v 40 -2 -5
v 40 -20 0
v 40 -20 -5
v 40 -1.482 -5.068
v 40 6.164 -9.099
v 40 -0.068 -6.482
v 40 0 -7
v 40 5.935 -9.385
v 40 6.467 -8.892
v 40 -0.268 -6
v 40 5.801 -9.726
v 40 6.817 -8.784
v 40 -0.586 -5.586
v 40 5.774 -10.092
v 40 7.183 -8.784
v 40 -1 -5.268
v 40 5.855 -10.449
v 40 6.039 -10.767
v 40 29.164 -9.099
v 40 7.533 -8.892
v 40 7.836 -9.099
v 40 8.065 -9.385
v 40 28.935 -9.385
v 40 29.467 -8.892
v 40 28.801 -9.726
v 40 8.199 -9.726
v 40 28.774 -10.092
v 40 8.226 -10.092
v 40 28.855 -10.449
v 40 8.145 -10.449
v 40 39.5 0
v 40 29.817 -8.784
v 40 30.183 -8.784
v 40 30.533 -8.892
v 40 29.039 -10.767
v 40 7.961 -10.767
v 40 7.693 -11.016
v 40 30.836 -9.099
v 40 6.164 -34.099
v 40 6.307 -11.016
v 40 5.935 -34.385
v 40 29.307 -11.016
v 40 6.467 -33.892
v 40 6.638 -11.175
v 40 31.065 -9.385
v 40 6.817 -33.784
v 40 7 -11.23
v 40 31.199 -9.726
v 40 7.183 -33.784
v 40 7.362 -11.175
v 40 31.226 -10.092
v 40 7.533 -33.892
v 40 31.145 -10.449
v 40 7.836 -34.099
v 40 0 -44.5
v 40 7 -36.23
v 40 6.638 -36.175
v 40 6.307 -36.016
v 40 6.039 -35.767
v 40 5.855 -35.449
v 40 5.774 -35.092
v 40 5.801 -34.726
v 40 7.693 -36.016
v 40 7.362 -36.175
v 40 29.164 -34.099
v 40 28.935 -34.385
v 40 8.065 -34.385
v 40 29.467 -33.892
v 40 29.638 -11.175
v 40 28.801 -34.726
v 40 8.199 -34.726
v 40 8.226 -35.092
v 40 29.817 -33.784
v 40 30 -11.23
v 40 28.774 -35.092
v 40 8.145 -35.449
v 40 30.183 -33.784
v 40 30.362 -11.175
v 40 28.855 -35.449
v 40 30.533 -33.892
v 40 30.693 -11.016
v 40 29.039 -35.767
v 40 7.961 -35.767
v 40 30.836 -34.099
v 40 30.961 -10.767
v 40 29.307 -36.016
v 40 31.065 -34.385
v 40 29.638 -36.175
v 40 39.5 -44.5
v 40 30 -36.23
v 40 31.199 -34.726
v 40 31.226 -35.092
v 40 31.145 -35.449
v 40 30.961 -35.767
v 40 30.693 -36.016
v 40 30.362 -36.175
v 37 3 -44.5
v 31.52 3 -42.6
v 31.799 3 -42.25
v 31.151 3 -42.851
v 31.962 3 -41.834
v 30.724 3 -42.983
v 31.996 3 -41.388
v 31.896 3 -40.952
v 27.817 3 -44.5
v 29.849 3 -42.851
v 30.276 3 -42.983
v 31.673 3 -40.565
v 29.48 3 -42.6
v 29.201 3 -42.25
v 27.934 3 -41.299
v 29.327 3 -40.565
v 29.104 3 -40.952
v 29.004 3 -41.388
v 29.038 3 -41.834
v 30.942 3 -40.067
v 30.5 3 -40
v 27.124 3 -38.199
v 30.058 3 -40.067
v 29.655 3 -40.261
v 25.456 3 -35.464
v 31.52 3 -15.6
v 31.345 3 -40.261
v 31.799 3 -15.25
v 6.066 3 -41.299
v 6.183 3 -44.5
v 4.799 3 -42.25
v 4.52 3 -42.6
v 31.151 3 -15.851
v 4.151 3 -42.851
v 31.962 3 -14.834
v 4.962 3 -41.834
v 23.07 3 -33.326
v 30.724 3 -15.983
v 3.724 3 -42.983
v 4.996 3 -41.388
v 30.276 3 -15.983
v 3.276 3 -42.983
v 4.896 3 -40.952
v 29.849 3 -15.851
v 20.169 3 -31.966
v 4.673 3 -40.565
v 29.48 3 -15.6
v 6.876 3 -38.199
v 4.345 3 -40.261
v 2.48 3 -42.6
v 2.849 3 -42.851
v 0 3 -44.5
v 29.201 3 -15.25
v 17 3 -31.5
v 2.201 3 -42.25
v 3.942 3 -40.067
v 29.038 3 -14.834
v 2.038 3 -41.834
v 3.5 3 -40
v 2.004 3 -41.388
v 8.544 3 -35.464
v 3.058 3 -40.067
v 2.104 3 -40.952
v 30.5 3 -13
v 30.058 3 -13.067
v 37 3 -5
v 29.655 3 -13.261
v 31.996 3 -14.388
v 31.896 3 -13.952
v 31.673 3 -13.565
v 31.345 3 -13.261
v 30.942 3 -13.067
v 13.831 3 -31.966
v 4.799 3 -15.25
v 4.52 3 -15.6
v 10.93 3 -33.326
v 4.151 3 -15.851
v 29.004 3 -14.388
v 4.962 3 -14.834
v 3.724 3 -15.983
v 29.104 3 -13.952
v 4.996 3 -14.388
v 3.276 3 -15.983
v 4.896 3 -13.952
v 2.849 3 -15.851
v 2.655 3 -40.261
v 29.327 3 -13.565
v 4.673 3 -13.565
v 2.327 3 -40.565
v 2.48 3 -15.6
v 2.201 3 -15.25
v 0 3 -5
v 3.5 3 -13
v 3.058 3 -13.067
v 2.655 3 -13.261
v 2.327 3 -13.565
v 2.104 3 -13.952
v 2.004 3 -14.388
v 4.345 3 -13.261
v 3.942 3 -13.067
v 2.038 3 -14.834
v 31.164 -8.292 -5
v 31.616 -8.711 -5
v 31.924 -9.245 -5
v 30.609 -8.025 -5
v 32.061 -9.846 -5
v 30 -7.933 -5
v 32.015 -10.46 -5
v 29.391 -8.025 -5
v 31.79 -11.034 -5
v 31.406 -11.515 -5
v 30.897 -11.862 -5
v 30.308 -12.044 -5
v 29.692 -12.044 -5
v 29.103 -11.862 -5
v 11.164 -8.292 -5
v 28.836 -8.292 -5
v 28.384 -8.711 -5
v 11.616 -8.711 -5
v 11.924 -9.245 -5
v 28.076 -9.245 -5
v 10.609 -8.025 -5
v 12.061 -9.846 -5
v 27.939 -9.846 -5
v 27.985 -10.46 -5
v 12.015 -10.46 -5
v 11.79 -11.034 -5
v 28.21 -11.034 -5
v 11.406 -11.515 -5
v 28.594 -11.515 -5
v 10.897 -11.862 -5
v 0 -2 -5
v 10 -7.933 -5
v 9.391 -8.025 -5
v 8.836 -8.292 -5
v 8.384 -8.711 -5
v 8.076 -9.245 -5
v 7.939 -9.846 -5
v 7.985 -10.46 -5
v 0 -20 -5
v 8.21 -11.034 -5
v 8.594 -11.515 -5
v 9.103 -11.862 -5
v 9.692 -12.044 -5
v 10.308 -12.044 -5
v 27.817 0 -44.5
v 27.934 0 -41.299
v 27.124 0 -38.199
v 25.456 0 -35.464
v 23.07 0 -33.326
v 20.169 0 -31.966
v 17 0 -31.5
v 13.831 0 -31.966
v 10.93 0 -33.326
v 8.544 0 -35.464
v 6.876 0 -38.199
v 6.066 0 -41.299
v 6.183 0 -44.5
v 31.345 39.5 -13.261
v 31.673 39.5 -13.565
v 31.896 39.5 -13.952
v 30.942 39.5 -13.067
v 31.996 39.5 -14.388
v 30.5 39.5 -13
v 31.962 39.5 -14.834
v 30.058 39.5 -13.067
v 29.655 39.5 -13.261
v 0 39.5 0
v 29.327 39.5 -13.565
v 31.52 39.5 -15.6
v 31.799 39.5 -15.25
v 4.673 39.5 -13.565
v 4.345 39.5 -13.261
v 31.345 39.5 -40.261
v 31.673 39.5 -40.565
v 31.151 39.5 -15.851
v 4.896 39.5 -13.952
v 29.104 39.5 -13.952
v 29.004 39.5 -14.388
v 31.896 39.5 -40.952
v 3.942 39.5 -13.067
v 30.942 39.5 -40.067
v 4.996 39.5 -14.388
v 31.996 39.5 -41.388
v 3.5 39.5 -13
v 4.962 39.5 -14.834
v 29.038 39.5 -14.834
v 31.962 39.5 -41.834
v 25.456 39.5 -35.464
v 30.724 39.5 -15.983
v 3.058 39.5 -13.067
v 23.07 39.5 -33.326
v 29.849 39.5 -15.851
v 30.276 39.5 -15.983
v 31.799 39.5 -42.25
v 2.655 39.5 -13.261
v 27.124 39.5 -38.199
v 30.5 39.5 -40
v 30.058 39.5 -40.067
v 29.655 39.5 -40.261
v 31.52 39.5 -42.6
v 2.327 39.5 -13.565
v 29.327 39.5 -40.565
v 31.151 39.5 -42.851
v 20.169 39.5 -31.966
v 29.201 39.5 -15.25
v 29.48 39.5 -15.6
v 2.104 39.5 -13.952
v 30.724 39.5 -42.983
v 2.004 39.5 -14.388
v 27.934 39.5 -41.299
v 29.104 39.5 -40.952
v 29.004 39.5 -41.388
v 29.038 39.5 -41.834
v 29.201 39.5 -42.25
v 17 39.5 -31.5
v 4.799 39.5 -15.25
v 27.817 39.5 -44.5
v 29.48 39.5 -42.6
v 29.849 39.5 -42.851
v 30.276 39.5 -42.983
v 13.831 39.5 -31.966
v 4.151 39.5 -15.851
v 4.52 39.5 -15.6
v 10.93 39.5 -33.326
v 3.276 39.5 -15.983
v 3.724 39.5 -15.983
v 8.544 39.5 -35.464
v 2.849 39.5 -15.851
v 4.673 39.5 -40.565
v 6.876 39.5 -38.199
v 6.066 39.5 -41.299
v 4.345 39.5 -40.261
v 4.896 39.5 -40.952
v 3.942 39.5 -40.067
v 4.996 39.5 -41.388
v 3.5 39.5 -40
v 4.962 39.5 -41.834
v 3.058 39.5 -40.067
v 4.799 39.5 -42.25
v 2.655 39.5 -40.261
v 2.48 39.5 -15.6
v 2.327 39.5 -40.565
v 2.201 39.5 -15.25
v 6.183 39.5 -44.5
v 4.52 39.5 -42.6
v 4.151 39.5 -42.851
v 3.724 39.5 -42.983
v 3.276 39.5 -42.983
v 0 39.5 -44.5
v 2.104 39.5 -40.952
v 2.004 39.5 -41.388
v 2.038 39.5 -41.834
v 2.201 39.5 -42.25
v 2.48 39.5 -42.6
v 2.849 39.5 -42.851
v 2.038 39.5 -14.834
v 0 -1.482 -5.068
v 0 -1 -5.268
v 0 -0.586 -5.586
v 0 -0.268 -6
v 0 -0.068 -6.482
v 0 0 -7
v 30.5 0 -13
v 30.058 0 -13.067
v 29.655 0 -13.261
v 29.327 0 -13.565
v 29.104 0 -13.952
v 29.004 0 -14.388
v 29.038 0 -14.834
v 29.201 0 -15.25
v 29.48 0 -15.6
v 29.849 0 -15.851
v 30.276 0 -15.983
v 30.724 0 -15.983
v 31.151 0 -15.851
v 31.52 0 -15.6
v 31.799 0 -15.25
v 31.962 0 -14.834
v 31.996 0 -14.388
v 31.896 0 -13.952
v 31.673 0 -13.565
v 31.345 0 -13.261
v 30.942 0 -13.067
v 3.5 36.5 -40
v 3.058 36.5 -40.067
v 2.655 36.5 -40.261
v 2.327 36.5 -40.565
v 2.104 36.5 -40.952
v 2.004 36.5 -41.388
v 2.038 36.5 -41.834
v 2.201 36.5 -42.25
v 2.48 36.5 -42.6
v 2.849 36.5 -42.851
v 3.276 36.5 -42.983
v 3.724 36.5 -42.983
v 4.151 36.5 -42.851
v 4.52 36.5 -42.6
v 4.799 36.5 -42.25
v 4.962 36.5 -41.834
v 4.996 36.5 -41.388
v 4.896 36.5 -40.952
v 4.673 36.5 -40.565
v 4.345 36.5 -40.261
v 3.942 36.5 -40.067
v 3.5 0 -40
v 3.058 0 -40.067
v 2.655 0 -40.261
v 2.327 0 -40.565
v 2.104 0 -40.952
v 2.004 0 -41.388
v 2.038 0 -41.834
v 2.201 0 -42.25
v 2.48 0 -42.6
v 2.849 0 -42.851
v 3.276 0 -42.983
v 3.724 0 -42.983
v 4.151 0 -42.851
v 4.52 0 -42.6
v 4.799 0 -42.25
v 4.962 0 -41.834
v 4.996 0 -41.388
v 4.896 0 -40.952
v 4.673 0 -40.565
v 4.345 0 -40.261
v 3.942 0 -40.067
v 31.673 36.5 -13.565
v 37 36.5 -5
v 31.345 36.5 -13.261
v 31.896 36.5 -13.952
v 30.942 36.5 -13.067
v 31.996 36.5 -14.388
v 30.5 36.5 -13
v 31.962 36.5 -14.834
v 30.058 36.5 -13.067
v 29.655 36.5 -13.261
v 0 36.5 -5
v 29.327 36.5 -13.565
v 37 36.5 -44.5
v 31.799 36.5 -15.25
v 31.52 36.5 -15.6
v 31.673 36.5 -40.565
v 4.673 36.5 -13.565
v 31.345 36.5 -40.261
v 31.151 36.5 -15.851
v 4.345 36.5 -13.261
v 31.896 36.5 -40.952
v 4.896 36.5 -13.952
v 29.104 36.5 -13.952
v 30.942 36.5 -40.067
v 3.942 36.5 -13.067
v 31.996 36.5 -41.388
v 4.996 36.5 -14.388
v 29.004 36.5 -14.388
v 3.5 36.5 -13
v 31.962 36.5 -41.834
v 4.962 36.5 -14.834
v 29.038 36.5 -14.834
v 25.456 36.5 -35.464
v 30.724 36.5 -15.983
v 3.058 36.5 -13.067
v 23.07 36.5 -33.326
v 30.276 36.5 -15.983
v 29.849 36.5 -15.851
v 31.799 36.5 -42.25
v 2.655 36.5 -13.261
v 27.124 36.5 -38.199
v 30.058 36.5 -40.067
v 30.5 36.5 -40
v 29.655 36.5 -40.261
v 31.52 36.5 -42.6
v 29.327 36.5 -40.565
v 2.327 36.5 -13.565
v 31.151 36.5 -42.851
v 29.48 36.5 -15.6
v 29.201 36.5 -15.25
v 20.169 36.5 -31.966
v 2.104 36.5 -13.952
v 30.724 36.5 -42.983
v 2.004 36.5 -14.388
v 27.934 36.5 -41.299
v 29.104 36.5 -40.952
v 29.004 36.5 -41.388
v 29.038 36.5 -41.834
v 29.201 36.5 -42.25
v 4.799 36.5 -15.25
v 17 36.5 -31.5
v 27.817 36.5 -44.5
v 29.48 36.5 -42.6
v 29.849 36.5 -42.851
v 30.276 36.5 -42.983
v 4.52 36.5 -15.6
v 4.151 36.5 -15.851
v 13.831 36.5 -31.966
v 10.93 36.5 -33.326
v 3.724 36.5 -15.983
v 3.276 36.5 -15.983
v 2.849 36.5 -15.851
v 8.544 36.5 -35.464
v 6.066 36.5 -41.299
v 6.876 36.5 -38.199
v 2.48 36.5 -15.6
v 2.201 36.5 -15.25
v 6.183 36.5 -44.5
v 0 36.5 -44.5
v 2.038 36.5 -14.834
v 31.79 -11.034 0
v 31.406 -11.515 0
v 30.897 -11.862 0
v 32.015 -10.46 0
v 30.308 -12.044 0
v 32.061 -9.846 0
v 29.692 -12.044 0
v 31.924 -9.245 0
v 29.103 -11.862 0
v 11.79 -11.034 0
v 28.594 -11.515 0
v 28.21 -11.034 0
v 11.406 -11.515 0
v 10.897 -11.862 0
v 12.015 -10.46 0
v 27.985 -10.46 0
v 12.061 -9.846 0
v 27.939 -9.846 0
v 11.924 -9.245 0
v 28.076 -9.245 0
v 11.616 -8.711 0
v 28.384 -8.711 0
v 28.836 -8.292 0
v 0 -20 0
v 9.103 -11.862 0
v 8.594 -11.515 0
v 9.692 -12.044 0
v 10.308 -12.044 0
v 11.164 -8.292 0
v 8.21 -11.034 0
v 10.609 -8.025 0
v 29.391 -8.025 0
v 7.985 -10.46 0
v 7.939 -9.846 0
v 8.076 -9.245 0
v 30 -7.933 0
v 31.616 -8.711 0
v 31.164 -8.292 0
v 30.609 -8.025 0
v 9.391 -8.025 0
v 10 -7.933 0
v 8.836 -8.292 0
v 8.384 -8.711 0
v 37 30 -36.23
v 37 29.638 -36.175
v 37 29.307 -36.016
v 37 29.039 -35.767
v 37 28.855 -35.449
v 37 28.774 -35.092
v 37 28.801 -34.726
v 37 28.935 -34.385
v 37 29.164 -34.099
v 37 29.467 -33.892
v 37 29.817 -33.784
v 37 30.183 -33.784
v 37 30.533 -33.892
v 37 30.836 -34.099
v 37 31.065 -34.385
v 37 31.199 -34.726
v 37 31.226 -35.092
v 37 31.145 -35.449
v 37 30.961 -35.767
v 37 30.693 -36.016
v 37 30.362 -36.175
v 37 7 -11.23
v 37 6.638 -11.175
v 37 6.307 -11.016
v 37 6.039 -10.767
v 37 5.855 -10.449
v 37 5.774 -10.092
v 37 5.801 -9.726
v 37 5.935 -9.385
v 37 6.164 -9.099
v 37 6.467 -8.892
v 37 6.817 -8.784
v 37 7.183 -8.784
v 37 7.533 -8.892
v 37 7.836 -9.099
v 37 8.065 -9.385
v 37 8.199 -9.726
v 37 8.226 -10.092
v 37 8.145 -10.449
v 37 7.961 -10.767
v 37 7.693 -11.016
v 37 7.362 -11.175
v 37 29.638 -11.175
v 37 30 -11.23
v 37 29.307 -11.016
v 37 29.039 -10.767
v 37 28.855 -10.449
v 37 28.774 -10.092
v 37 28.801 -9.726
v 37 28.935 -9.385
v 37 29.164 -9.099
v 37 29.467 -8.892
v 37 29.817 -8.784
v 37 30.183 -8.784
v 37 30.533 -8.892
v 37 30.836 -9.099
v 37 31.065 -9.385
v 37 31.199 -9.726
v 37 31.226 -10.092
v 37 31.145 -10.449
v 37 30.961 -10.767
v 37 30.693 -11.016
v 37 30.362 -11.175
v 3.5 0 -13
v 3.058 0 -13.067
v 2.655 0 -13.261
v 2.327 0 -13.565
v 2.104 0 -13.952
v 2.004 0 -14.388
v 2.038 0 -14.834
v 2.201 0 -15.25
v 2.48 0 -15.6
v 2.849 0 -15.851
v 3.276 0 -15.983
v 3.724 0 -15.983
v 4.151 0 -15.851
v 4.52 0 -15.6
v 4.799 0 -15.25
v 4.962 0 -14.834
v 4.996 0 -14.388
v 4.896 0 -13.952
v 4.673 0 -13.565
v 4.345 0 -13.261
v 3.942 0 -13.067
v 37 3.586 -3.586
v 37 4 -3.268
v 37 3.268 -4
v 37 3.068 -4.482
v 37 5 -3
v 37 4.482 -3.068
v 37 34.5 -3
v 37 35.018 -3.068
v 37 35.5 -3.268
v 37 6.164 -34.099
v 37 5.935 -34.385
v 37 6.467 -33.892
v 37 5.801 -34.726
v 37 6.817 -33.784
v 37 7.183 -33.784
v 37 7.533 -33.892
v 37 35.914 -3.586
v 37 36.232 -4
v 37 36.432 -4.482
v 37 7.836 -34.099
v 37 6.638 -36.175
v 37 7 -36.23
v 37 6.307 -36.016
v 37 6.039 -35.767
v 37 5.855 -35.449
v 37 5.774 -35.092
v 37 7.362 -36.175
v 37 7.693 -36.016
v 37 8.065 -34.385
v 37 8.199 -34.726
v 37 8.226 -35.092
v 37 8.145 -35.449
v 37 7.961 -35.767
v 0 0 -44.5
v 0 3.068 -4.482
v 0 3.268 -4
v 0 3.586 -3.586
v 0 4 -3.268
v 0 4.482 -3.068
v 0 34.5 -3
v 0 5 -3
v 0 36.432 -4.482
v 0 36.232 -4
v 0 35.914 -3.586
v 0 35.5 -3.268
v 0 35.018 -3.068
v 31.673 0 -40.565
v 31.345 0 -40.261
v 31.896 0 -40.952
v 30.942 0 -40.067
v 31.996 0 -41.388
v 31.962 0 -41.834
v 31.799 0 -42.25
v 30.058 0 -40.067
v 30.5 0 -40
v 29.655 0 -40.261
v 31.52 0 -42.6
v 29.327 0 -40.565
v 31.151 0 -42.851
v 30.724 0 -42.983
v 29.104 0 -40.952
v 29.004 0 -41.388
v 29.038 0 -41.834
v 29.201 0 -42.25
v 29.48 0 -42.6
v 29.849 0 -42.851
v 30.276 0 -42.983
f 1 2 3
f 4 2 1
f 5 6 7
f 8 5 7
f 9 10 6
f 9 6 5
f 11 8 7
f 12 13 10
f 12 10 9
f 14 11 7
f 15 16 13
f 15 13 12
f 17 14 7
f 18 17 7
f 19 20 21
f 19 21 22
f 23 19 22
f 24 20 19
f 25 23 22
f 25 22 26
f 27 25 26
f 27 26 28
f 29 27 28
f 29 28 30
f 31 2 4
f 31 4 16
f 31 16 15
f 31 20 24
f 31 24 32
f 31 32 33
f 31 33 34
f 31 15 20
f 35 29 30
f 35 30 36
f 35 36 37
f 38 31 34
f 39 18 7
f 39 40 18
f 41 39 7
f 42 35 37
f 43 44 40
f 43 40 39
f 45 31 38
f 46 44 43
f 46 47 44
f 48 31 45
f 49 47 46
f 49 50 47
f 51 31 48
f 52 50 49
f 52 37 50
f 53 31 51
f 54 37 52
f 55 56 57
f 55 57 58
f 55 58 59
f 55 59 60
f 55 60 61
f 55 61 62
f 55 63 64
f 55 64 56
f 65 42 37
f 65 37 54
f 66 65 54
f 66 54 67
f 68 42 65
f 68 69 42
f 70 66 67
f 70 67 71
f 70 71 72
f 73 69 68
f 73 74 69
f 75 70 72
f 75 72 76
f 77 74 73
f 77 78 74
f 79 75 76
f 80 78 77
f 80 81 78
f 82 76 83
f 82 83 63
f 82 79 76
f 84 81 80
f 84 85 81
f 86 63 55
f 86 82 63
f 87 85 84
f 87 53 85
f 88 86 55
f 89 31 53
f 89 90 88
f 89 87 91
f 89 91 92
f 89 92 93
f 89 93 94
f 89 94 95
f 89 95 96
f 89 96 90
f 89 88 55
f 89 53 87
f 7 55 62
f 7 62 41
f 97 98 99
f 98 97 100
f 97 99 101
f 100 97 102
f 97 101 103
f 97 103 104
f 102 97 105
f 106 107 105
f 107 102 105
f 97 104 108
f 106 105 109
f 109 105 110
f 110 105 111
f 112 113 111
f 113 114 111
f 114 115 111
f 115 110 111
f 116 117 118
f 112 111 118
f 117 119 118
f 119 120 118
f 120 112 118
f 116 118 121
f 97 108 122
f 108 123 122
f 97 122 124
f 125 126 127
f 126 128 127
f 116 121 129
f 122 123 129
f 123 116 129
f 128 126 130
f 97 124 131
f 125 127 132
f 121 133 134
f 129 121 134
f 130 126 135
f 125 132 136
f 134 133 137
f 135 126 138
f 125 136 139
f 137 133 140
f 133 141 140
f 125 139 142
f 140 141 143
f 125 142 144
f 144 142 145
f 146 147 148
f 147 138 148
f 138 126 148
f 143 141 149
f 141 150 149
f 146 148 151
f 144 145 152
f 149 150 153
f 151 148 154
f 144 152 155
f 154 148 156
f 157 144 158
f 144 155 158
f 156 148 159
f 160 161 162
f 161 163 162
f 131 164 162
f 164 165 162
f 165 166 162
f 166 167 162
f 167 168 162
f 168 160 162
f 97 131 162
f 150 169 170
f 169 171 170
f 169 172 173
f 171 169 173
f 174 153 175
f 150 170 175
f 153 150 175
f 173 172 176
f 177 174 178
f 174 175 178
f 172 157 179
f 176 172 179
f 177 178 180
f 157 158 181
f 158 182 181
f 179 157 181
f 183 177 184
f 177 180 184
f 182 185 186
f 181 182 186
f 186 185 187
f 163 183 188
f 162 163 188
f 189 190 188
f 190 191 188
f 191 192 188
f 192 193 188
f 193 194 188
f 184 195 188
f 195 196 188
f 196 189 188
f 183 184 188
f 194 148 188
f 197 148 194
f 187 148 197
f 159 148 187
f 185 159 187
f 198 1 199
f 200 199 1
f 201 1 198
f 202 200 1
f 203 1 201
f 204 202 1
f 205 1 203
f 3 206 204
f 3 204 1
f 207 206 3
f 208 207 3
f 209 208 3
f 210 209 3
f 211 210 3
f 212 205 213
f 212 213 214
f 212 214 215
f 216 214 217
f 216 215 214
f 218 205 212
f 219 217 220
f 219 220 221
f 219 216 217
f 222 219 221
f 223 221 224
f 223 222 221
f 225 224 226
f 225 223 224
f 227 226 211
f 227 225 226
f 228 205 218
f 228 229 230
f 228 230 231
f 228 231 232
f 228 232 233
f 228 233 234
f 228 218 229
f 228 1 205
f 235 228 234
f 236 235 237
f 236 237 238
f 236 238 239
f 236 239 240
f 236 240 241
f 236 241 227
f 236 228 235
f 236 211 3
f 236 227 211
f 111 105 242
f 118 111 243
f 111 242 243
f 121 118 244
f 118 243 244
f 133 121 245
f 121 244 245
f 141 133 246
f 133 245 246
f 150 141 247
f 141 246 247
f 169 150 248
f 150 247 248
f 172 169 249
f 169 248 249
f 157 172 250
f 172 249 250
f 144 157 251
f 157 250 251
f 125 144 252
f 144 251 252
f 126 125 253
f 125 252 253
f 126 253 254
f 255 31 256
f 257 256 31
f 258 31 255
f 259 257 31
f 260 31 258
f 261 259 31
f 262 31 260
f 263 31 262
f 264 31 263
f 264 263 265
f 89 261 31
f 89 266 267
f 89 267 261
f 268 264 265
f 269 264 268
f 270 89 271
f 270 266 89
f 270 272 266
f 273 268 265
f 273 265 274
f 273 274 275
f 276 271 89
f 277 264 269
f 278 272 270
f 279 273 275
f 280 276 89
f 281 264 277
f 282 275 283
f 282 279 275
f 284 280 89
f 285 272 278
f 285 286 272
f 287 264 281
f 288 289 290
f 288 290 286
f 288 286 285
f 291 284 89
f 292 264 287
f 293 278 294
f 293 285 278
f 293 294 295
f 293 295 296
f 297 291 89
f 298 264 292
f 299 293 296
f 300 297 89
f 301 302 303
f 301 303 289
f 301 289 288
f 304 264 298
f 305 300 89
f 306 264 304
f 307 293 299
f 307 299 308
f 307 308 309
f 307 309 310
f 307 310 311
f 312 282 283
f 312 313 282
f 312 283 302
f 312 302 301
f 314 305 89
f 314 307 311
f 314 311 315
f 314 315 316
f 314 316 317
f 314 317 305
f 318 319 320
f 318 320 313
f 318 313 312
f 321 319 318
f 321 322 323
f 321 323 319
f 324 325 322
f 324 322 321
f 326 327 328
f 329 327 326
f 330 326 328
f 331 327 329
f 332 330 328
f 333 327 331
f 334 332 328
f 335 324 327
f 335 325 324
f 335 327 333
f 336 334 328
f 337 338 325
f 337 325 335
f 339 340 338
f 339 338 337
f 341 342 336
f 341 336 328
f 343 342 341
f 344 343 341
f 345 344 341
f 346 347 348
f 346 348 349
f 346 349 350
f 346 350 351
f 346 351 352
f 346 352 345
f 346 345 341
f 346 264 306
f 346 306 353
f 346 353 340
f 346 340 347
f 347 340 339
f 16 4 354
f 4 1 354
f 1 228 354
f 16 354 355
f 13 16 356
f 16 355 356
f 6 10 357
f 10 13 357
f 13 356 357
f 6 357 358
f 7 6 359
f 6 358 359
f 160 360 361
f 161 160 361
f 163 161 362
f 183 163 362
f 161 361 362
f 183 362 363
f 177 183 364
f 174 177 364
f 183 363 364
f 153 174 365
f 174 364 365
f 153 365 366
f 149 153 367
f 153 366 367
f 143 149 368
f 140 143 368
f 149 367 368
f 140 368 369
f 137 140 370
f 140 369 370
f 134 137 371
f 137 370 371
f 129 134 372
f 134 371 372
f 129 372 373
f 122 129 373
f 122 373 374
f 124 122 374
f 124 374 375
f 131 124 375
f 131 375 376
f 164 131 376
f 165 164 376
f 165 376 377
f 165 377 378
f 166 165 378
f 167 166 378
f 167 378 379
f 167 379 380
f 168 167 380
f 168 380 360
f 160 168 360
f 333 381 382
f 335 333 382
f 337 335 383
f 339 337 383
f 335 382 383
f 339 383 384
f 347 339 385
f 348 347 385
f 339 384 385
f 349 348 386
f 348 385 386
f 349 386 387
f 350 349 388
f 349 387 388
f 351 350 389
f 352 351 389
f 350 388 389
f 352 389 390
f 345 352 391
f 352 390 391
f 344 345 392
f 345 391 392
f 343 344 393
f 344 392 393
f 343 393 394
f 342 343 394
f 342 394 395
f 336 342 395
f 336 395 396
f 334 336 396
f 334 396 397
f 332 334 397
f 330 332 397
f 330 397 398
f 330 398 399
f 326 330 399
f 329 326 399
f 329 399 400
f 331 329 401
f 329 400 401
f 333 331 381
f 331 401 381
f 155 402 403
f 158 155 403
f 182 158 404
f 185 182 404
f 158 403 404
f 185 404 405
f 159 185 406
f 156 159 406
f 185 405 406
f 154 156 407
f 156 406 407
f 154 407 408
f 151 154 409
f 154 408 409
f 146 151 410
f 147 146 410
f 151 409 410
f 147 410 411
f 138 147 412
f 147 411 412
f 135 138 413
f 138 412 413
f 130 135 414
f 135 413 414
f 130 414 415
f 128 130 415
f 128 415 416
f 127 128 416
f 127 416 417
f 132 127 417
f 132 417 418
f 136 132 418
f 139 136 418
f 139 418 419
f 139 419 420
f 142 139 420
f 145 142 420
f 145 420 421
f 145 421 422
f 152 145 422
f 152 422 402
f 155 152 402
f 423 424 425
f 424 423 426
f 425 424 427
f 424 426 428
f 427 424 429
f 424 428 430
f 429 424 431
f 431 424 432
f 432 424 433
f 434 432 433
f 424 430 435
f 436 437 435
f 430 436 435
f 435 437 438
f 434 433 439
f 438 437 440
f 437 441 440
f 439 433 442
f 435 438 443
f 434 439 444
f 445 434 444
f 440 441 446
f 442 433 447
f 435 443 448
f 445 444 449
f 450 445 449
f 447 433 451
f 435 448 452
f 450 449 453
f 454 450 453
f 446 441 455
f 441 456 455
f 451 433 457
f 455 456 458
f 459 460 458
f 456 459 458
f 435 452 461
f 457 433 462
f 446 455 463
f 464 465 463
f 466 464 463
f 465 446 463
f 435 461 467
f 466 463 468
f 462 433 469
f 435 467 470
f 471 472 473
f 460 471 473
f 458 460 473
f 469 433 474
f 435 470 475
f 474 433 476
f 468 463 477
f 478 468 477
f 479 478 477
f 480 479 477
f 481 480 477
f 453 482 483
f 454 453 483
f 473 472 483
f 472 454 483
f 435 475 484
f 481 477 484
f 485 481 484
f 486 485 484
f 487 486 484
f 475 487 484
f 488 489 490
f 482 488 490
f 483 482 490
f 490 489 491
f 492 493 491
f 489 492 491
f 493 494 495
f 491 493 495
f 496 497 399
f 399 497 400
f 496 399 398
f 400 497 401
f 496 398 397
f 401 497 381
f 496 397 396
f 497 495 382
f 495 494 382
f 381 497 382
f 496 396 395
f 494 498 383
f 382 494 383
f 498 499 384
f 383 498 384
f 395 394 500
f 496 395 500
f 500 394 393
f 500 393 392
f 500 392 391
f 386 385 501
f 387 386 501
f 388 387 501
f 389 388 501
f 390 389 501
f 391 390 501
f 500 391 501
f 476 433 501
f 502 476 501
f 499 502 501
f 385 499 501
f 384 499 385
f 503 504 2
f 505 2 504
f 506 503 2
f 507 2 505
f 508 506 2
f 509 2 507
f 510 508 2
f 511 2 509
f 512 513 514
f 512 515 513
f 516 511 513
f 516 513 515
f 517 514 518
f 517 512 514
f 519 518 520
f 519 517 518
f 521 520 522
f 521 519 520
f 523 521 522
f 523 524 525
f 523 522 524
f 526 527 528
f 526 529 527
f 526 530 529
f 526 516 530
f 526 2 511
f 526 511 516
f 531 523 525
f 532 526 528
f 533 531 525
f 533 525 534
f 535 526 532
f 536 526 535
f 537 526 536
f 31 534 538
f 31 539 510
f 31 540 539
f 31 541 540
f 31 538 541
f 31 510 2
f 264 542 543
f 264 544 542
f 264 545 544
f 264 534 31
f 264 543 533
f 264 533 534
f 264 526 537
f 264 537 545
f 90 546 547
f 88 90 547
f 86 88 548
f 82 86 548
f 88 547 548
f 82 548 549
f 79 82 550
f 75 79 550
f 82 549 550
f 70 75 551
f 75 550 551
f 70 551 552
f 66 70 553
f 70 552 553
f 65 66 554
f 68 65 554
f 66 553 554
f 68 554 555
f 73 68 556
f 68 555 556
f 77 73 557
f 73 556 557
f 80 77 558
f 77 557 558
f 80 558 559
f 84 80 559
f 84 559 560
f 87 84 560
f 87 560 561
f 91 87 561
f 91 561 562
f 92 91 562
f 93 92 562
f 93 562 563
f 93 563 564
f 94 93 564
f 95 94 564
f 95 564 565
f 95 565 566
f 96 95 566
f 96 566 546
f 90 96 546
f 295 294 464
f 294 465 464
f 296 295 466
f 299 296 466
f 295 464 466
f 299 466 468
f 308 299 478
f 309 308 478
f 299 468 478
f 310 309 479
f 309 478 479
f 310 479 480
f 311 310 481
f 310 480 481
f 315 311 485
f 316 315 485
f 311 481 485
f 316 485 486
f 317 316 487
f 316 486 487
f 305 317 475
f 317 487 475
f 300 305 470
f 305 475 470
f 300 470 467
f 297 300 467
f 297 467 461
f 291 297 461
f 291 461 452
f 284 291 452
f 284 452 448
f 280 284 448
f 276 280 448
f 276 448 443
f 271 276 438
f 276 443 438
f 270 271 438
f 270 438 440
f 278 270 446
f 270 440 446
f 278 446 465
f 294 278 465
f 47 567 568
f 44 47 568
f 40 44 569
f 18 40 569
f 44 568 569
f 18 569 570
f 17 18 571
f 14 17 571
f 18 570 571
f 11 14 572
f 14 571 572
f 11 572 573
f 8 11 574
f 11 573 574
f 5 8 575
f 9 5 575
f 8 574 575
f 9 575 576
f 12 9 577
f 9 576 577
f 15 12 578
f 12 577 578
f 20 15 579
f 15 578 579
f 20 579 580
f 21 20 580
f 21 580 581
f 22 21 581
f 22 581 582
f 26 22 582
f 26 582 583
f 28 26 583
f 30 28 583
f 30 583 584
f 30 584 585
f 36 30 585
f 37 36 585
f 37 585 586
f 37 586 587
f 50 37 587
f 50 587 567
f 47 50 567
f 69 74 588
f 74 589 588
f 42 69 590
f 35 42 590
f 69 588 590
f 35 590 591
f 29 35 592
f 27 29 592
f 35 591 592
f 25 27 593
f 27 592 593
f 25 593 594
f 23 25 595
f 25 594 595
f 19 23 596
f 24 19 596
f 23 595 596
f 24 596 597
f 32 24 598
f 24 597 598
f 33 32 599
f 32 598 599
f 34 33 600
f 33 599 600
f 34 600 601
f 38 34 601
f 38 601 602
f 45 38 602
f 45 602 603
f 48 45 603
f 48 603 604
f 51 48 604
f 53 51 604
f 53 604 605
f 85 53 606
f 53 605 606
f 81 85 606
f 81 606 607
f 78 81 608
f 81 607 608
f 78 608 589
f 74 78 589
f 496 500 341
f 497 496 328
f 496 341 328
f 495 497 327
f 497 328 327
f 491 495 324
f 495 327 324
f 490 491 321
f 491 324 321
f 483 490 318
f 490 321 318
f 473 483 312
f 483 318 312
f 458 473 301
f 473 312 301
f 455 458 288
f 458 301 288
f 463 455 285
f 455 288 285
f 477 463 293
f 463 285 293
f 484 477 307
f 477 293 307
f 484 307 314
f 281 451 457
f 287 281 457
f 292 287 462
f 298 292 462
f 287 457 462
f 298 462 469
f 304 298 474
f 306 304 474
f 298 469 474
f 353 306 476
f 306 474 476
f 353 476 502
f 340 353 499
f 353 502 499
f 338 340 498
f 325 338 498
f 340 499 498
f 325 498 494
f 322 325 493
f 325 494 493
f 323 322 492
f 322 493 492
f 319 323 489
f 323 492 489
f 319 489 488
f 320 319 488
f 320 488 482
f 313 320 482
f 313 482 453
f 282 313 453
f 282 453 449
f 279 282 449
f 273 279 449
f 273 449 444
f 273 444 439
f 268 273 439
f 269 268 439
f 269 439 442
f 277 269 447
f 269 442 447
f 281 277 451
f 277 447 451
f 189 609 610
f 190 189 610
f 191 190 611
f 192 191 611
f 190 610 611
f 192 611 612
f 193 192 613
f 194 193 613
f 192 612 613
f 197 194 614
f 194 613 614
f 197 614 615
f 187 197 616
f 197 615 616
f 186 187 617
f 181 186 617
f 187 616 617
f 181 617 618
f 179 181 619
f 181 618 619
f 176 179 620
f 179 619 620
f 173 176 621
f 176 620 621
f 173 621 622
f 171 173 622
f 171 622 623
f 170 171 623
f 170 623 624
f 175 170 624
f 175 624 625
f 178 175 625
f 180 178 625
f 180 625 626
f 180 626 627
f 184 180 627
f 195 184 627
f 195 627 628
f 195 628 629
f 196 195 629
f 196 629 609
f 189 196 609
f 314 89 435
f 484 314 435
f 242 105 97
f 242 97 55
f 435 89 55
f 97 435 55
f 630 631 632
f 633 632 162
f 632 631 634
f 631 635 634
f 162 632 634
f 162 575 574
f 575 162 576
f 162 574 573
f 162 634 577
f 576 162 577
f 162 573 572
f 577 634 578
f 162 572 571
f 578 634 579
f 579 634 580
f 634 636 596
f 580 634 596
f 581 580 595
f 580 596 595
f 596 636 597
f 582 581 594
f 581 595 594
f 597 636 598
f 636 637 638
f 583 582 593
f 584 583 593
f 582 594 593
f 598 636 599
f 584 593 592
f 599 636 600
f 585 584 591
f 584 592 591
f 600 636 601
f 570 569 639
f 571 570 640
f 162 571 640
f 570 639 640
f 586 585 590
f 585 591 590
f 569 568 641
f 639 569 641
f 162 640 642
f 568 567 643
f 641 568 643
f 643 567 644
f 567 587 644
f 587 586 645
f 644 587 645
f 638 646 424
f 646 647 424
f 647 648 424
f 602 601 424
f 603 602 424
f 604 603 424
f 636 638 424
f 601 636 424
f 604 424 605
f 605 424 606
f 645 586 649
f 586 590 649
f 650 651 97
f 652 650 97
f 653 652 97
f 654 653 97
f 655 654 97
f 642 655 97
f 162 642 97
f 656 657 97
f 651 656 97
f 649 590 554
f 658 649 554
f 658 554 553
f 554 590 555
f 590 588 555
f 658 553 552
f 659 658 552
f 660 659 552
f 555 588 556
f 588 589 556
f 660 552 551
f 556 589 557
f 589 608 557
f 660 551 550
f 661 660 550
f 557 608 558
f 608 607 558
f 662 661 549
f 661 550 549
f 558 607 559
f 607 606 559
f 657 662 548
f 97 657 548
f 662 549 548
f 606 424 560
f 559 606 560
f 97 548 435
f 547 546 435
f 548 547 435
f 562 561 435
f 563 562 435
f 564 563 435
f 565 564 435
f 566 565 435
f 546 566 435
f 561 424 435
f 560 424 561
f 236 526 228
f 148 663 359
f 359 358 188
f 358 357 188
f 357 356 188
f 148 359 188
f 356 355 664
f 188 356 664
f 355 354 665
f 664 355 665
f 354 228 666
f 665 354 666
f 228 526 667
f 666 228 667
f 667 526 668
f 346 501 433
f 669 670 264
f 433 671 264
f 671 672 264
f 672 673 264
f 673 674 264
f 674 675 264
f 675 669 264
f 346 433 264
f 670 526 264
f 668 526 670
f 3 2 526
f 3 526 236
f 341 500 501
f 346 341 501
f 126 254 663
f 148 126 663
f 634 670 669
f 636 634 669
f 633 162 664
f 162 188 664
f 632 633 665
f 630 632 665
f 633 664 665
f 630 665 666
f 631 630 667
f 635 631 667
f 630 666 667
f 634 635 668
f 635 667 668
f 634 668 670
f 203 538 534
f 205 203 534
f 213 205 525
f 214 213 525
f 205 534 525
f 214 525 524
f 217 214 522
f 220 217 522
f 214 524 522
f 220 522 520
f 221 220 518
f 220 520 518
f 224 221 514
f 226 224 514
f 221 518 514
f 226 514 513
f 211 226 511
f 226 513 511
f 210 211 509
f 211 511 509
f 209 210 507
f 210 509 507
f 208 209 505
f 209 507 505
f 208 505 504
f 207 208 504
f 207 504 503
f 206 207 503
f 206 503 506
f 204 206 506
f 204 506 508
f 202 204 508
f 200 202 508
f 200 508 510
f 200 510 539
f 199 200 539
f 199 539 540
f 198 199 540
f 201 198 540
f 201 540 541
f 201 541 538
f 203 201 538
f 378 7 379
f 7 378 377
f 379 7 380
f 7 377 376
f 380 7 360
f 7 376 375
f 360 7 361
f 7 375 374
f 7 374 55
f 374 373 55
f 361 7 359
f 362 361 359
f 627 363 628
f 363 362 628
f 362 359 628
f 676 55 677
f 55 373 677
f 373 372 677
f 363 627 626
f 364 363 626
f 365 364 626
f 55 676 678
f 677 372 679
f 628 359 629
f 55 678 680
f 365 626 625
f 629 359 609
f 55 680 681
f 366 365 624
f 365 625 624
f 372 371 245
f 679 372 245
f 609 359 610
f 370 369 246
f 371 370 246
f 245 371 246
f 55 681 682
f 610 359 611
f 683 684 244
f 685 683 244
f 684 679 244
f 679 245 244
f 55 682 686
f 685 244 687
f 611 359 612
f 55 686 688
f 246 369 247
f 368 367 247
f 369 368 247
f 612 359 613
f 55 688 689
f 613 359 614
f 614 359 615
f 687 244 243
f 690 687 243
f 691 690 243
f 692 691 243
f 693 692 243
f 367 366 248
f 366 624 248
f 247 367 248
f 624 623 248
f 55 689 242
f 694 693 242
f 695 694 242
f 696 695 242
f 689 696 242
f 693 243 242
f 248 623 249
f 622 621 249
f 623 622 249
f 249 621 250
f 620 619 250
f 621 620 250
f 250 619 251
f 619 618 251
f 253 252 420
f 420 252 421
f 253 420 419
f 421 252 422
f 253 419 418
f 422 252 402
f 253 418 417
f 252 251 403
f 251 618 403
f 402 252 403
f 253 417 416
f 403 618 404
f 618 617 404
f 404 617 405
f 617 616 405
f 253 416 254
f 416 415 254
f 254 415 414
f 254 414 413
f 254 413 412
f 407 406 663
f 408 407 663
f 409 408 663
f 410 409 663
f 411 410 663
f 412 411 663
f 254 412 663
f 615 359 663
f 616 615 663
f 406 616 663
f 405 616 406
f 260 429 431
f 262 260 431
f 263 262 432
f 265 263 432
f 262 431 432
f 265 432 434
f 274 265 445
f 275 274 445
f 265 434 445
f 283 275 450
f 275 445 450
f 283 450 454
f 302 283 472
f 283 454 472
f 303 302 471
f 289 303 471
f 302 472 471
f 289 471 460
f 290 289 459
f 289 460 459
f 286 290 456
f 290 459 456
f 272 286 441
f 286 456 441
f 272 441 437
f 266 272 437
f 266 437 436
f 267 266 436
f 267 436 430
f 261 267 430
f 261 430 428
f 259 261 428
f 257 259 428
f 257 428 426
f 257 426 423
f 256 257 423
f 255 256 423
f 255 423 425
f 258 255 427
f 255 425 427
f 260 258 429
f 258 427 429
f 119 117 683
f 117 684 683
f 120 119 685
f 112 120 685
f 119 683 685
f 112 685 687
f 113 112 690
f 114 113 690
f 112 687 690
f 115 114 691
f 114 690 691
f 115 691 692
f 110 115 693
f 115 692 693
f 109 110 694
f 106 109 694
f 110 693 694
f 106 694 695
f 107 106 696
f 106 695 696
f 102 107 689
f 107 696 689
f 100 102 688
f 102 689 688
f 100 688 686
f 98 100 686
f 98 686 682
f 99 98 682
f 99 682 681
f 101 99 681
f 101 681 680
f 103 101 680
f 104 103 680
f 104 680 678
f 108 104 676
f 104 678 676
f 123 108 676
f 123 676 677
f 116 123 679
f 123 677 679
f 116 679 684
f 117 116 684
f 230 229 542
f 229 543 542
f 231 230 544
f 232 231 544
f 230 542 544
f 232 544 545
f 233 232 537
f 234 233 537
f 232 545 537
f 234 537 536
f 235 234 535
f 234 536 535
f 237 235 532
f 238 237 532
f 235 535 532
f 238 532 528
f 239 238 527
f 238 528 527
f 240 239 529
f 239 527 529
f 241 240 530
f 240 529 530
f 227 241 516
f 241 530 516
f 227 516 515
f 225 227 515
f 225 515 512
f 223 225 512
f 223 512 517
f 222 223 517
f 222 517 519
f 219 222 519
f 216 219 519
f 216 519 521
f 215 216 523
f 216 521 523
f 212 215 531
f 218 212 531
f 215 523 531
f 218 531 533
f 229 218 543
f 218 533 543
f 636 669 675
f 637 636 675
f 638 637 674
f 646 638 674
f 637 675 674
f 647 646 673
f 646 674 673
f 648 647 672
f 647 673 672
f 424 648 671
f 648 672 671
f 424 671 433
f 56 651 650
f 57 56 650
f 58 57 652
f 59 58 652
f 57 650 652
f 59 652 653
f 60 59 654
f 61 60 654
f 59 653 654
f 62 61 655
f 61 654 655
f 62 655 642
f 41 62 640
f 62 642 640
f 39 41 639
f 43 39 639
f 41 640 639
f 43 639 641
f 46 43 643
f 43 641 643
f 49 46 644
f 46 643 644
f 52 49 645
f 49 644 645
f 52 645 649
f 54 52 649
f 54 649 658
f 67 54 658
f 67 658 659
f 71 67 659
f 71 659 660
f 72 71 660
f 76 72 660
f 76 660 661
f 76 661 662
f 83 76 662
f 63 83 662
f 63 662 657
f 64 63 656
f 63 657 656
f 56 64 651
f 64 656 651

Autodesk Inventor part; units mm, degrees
ref_plane "YZ Plane" through (0, 0, 0) normal (1, 0, 0) x (0, 1, 0)
ref_plane "XZ Plane" through (0, 0, 0) normal (0, 1, 0) x (-1, 0, 0)
ref_plane "XY Plane" through (0, 0, 0) normal (0, 0, 1) x (1, 0, 0)
sketch "スケッチ1" plane through (0, 0, 0) normal (0, 1, 0) x (-1, 0, 0)
  line L0 (0, 0) -> (-34, 0)
  line L1 (-34, 0) -> (-34, -44.5)
  line L2 (-34, -44.5) -> (0, -44.5)
  line L3 (0, -44.5) -> (0, 0)
  dimension "d0" = 44.5
  dimension "d1" = 34
extrude "押し出し1" add sketch "スケッチ1" along normal blind 39.5
sketch "スケッチ2" plane through (34, 0, 0) normal (1, 0, 0) x (0, 0, -1)
  line L0 (3, 36.5) -> (53, 36.5)
  line L1 (53, 36.5) -> (53, 3)
  line L2 (53, 3) -> (3, 3)
  line L3 (3, 3) -> (3, 36.5)
  line L4 (0, 39.5) -> (44.5, 39.5) projected
  line L5 (0, 0) -> (0, 39.5) projected
  dimension "d4" = 3
  dimension "d5" = 3
  dimension "d6" = 33.5
  dimension "d7" = 50
extrude "押し出し2" cut sketch "スケッチ2" against normal blind 43.5
sketch "スケッチ3" plane through (0, 0, 0) normal (0, -1, 0) x (1, 0, 0)
  circle A0 centre (17, -42.5) radius 11
  line L0 (34, -44.5) -> (0, -44.5) projected
  line L1 (0, -44.5) -> (0, 0) projected
  point P0 (6.1833, -44.5)
  point P1 (27.8167, -44.5)
  dimension "d10" = 22
  dimension "d11" = 2
  dimension "d12" = 17
extrude "押し出し3" cut sketch "スケッチ3" against normal blind 3 contours A0 L0 picked at (20.7405, -38.2254)
sketch "スケッチ4" plane through (0, 39.5, 0) normal (0, 1, 0) x (1, 0, 0)
  circle A0 centre (17, 42.5) radius 11
  line L0 (34, 44.5) -> (0, 44.5) projected
  line L1 (0, 44.5) -> (0, 0) projected
  point P0 (27.8167, 44.5)
  point P1 (6.1833, 44.5)
  point P2 (0, 35.0774)
  dimension "d15" = 22
  dimension "d16" = 2
  dimension "d17" = 17
extrude "押し出し4" cut sketch "スケッチ4" against normal blind 3
sketch "スケッチ5" plane through (0, 39.5, 0) normal (0, 1, 0) x (1, 0, 0)
  line L0 (0, 0) -> (34, 0) projected
  line L1 (0, 44.5) -> (0, 0) projected
  line L2 (34, 0) -> (34, 44.5) projected
  point P0 (3.5, 14.5)
  point P1 (3.5, 41.5)
  point P2 (30.5, 41.5)
  point P3 (30.5, 14.5)
  dimension "d20" = 14.5
  dimension "d21" = 3.5
  dimension "d22" = 27
  dimension "d23" = 3.5
  dimension "d48" = 3.5
  dimension "d55" = 14.5
  dimension "d56" = 27
hole "穴1" at (3.5, 39.5, -14.5) at (3.5, 39.5, -41.5) at (30.5, 39.5, -41.5) at (30.5, 39.5, -14.5) direction (0, -1, 0) diameter 3 end through all
fillet "フィレット1" radius 2 1 edges at (17, 36.5, -3)
fillet "フィレット2" radius 2 1 edges at (17, 3, -3)
sketch "スケッチ8" plane through (0, 0, 0) normal (0, 0, 1) x (1, 0, 0)
  line L0 (0, 0) -> (34, 0)
  line L1 (34, 0) -> (34, -20)
  line L2 (34, -20) -> (0, -20)
  line L3 (0, -20) -> (0, 0)
  line L4 (34, 0) -> (34, 39.5) projected
  dimension "d59" = 20
extrude "押し出し5" add sketch "スケッチ8" against normal blind 5
sketch "スケッチ9" plane through (0, 0, -5) normal (0, 0, -1) x (-1, 0, 0)
  line L0 (-30, -10) -> (-10, -10)
  line L1 (-34, -20) -> (0, -20) projected
  line L2 (-34, 0) -> (-34, -20) projected
  line L3 (0, -20) -> (0, 0) projected
  point P0 (-17, -20)
  point P1 (-34, -10)
  dimension "d62" = 20
  dimension "d71" = 10
hole "穴3" at (30, -10, -5) at (10, -10, -5) direction (0, 0, 1) diameter 4.134 end through all thread size "M5x0.8" class "6H" standard "ISO Metric profile"
sketch "スケッチ11" plane through (34, 39.5, 0) normal (1, 0, 0) x (0, 0, -1)
  line L0 (3, -34.5) -> (3, -5) projected
  arc A0 (5, -3) -> (3, -5) centre (5, -5) ccw projected
  line L1 (5, -3) -> (44.5, -3) projected
  line L2 (44.5, -3) -> (44.5, 0) projected
  line L3 (0, 0) -> (44.5, 0) projected
  line L4 (0, -59.5) -> (0, 0) projected
  line L5 (0, -59.5) -> (5, -59.5) projected
  line L6 (5, -39.5) -> (5, -59.5) projected
  line L7 (44.5, -36.5) -> (5, -36.5) projected
  arc A1 (3, -34.5) -> (5, -36.5) centre (5, -34.5) ccw projected
  line L8 (5, -39.5) -> (44.5, -39.5) projected
  line L9 (44.5, -39.5) -> (44.5, -36.5) projected
  point P0 (0, -39.5)
extrude "押し出し6" add sketch "スケッチ11" along normal blind 6
fillet "フィレット4" radius 2 1 edges at (20, 0, -5)
sketch "スケッチ17" plane through (40, 39.5, 0) normal (1, 0, 0) x (0, 0, -1)
  line L0 (44.5, -36.5) -> (5, -36.5) projected
  line L1 (44.5, -36.5) -> (3, -36.5)
  line L2 (3, -36.5) -> (3, -3)
  line L3 (3, -3) -> (44.5, -3)
  line L4 (44.5, -3) -> (44.5, -36.5)
  point P0 (0, -39.5)
  point P1 (5, -36.5)
extrude "押し出し9" add sketch "スケッチ17" against normal blind 3
sketch "スケッチ19" plane through (40, 39.5, 0) normal (1, 0, 0) x (0, 0, -1)
  line L0 (44.5, 0) -> (0, 0) projected
  line L1 (0, 0) -> (0, -59.5) projected
  point P0 (0, -39.5)
  point P1 (10, -9.5)
  point P2 (35, -9.5)
  point P3 (10, -32.5)
  point P4 (35, -32.5)
  dimension "d114" = 9.5
  dimension "d115" = 10
  dimension "d118" = 25
  dimension "d125" = 23
  dimension "d137" = 23
hole "穴6" at (40, 30, -10) at (40, 30, -35) at (40, 7, -10) at (40, 7, -35) direction (-1, 0, 0) diameter 2.459 end through all thread size "M3x0.5" class "6H" standard "ISO Metric profile"
properties part number "サーボモータ固定用"
